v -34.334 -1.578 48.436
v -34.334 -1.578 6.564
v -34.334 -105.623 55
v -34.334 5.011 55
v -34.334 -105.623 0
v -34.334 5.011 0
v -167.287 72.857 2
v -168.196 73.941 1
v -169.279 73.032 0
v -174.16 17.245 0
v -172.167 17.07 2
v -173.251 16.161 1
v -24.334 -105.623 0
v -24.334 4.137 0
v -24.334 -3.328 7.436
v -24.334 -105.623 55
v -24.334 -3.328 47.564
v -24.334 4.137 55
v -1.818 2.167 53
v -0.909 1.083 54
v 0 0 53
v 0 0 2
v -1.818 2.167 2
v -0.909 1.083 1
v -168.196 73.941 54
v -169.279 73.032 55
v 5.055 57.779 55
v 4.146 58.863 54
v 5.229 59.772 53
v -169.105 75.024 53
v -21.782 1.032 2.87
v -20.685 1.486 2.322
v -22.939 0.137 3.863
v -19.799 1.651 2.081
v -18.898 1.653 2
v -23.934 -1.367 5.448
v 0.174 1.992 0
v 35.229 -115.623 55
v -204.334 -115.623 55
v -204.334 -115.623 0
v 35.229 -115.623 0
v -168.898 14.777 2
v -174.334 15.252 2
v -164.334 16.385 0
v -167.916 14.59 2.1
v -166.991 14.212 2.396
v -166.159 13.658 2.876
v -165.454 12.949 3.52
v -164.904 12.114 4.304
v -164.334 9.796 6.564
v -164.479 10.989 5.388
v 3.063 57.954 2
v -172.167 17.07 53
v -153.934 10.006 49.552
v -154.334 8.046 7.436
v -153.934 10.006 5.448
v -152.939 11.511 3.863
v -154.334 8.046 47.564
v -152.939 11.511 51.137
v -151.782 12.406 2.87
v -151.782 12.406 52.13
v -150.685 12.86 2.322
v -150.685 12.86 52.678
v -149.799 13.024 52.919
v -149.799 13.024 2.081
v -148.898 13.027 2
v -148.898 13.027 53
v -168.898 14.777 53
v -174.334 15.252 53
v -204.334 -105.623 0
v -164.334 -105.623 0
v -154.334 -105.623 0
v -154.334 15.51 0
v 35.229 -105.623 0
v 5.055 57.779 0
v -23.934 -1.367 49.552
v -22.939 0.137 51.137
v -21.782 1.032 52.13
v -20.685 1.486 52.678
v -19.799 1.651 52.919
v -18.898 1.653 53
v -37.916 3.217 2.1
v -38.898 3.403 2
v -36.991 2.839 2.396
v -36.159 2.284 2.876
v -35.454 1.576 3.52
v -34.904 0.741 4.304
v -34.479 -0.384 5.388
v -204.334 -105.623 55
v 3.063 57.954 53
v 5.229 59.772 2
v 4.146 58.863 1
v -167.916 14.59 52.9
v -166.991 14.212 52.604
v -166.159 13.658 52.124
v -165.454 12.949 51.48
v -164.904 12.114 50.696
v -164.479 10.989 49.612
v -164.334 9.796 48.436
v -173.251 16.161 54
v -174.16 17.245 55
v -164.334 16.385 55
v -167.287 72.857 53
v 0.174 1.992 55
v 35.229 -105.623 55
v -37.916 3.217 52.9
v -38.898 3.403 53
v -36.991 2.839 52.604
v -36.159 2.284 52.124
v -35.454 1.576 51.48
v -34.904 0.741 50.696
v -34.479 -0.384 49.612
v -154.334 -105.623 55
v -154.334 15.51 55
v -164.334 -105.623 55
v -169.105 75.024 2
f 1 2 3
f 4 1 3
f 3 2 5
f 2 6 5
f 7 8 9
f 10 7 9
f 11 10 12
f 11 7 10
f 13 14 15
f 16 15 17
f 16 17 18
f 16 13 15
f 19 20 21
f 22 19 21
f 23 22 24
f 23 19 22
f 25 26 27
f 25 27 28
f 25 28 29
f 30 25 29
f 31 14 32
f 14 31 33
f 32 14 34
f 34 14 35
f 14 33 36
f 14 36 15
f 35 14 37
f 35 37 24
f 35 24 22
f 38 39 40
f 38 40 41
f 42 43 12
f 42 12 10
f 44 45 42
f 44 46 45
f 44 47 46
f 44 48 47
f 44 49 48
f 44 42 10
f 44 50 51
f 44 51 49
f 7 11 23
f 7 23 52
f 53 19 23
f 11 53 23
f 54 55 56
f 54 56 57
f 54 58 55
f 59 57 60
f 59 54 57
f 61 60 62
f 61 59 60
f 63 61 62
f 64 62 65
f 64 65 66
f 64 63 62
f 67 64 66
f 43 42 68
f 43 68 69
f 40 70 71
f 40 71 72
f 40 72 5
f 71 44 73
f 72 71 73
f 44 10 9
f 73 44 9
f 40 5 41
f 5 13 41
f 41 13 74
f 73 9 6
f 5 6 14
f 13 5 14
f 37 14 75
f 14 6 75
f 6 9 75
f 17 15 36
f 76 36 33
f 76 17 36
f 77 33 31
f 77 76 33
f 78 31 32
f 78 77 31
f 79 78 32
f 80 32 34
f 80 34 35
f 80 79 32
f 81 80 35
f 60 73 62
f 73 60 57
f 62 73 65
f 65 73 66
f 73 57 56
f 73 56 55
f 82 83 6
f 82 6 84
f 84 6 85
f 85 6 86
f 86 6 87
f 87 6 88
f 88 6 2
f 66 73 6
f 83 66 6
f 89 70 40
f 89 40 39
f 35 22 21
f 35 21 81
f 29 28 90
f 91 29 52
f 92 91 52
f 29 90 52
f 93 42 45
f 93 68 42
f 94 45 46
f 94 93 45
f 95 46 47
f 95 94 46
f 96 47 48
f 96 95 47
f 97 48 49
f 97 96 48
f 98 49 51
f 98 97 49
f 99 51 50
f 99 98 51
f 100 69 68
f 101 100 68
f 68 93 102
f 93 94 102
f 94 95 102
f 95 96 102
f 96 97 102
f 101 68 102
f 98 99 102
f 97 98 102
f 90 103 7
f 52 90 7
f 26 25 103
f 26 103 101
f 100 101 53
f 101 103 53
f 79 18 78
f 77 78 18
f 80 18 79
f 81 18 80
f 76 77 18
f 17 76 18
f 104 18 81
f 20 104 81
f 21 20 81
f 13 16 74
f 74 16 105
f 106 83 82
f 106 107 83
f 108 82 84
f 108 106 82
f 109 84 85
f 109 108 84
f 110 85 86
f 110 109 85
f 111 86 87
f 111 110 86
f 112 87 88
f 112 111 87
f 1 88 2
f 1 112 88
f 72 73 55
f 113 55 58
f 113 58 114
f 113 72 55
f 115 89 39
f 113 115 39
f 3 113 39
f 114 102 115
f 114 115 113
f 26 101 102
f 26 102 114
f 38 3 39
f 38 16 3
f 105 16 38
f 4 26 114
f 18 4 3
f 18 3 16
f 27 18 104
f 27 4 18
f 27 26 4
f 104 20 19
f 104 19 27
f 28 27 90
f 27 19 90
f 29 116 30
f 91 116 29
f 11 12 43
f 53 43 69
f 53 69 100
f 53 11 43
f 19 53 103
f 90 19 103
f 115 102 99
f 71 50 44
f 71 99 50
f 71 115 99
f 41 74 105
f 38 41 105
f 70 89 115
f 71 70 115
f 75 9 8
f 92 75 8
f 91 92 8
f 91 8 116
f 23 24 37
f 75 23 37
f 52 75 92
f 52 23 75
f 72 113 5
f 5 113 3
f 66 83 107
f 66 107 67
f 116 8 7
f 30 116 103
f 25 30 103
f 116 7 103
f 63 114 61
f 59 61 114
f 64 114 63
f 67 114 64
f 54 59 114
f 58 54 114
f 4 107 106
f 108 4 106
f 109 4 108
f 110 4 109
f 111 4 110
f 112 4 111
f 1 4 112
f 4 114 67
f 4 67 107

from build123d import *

# Parameters (mm, degrees)
BOSS_EXTRUDE1_DEPTH = 55
SKETCH2_W           = 51
SKETCH2_H           = 56
CUT_EXTRUDE1_DEPTH  = 198.600505619
BOSS_EXTRUDE4_DEPTH = 55
SKETCH7_W           = 239.563416731
SKETCH7_H           = 55
BOSS_EXTRUDE5_DEPTH = 10
CHAMFER6_SIZE       = 2
CHAMFER7_SIZE       = 2
FILLET4_R           = 5
FILLET5_R           = 5
FILLET6_R           = 5
FILLET7_R           = 5


# Some blends are built 0.0001 mm under size
with BuildPart() as part:
    # Sketch1 → Boss-Extrude1 (new body)
    with BuildSketch(Plane.XY):
        Polygon((0, 0), (-174.334072166, 15.252254981), (-169.104727601, 75.023936866), (5.229344565, 59.771681886), align=None)
    extrude(amount=BOSS_EXTRUDE1_DEPTH)

    # Sketch2 → Cut-Extrude1 (cut, through all)
    with BuildSketch(Plane(origin=(0, 0, 0), x_dir=(0, 0, -1), z_dir=(0.9961946980917452, -0.08715574274766201, 0))):
        with Locations((-27.5, 30)):
            Rectangle(SKETCH2_W, SKETCH2_H)
    extrude(amount=-CUT_EXTRUDE1_DEPTH, mode=Mode.SUBTRACT)

    # Sketch3 → Boss-Extrude4 (add)
    with BuildSketch(Plane.XY):
        Polygon((-164.334072166, 14.377368346), (-164.334072166, -105.622631654), (-154.334072166, -105.622631654), (-154.334072166, 13.50248171), align=None)
        Polygon((-34.334072166, 3.003842087), (-34.334072166, -105.622631654), (-24.334072166, -105.622631654), (-24.334072166, 2.128955452), align=None)
    extrude(amount=BOSS_EXTRUDE4_DEPTH)

    # Sketch7 → Boss-Extrude5 (add)
    with BuildSketch(Plane.XZ.offset(105.622631654)):
        with Locations((-84.5523638, 27.5)):
            Rectangle(SKETCH7_W, SKETCH7_H)
    extrude(amount=BOSS_EXTRUDE5_DEPTH)

    # Chamfer6
    chamfer6_edges = [part.edges().sort_by_distance(p)[0] for p in [
        (-169.279039087, 73.03154747, 27.5),
        (-171.719399884, 45.138095924, 53),
        (-174.159760681, 17.244644377, 27.5),
        (-171.719399884, 45.138095924, 2),
        (2.614672282, 29.885840943, 2),
        (5.055033079, 57.779292489, 27.5),
        (2.614672282, 29.885840943, 53),
        (0.174311485, 1.992389396, 27.5),
    ]]
    chamfer(chamfer6_edges, length=CHAMFER6_SIZE - 0.0001)  # a hair under: the kernel refuses the full size

    # Chamfer7
    # the kernel refuses this chamfer: 2 mm, written as the material it takes off along each edge
    with BuildSketch(Plane(origin=(-159.21027825, 13.929094464, 55), x_dir=(-0.0023964235484937708, -0.027391246498851614, -0.9996219169112968), z_dir=(-0.9961946980917452, 0.08715574274766169, 0))) as chamfer7_piece_1_section:
        Polygon((CHAMFER7_SIZE * 0.999621916911, -CHAMFER7_SIZE * 0.0274958766106), (-CHAMFER7_SIZE * 0.0274958766106, -CHAMFER7_SIZE * 0.999621916911), (0, 0), align=None)
    chamfer7_piece_1 = extrude(amount=20.324930327, mode=Mode.PRIVATE)
    chamfer7_piece_1 = split(chamfer7_piece_1, bisect_by=Plane(origin=(-164.334072166, 15.69707124, 54.339627198), z_dir=(-1, 0, 0)), keep=Keep.TOP, mode=Mode.PRIVATE)
    add(chamfer7_piece_1, mode=Mode.SUBTRACT)
    with BuildSketch(Plane(origin=(-29.21027825, 2.555568205, 0), x_dir=(0.08712279063524543, 0.9958180537233409, -0.02749587661058642), z_dir=(-0.9961946980917452, 0.08715574274766169, 0))) as chamfer7_piece_2_section:
        Polygon((CHAMFER7_SIZE * 0.999621916911, -CHAMFER7_SIZE * 0.0274958766106), (-CHAMFER7_SIZE * 0.0274958766106, -CHAMFER7_SIZE * 0.999621916911), (0, 0), align=None)
    chamfer7_piece_2 = extrude(amount=130.745112457, mode=Mode.PRIVATE)
    chamfer7_piece_2 = split(chamfer7_piece_2, bisect_by=Plane(origin=(-34.334072166, 8.915268669, 0.659587254), z_dir=(-1, 0, 0)), keep=Keep.TOP, mode=Mode.PRIVATE)
    chamfer7_piece_2 = split(chamfer7_piece_2, bisect_by=Plane(origin=(-154.334072166, 8.915268669, 0.659587254), z_dir=(1, 0, 0)), keep=Keep.TOP, mode=Mode.PRIVATE)
    add(chamfer7_piece_2, mode=Mode.SUBTRACT)
    with BuildSketch(Plane(origin=(5.123793916, -0.448273882, 0), x_dir=(0.08712279063524543, 0.9958180537233409, -0.027495876610586438), z_dir=(-0.9961946980917452, 0.08715574274766169, 0))) as chamfer7_piece_3_section:
        Polygon((CHAMFER7_SIZE * 0.999621916911, -CHAMFER7_SIZE * 0.0274958766106), (-CHAMFER7_SIZE * 0.0274958766106, -CHAMFER7_SIZE * 0.999621916911), (0, 0), align=None)
    chamfer7_piece_3 = extrude(amount=34.71375632, mode=Mode.PRIVATE)
    chamfer7_piece_3 = split(chamfer7_piece_3, bisect_by=Plane(origin=(-24.334072166, 1.500682903, 0.659186265), z_dir=(1, 0, 0)), keep=Keep.TOP, mode=Mode.PRIVATE)
    add(chamfer7_piece_3, mode=Mode.SUBTRACT)
    with BuildSketch(Plane(origin=(-29.21027825, 2.555568205, 55), x_dir=(0.08712279063524543, 0.9958180537233409, 0.02749587661058574), z_dir=(-0.9961946980917452, 0.08715574274766169, 0))) as chamfer7_piece_4_section:
        Polygon((CHAMFER7_SIZE * 0.999621916911, CHAMFER7_SIZE * 0.0274958766106), (-CHAMFER7_SIZE * 0.0274958766106, CHAMFER7_SIZE * 0.999621916911), (0, 0), align=None)
    chamfer7_piece_4 = extrude(amount=130.745112457, mode=Mode.PRIVATE)
    chamfer7_piece_4 = split(chamfer7_piece_4, bisect_by=Plane(origin=(-34.334072166, 8.915268669, 54.340412746), z_dir=(-1, 0, 0)), keep=Keep.TOP, mode=Mode.PRIVATE)
    chamfer7_piece_4 = split(chamfer7_piece_4, bisect_by=Plane(origin=(-154.334072166, 8.915268669, 54.340412746), z_dir=(1, 0, 0)), keep=Keep.TOP, mode=Mode.PRIVATE)
    add(chamfer7_piece_4, mode=Mode.SUBTRACT)
    with BuildSketch(Plane(origin=(5.123793916, -0.448273882, 55), x_dir=(0.08712279063524543, 0.9958180537233409, 0.02749587661058574), z_dir=(-0.9961946980917452, 0.08715574274766169, 0))) as chamfer7_piece_5_section:
        Polygon((CHAMFER7_SIZE * 0.999621916911, CHAMFER7_SIZE * 0.0274958766106), (-CHAMFER7_SIZE * 0.0274958766106, CHAMFER7_SIZE * 0.999621916911), (0, 0), align=None)
    chamfer7_piece_5 = extrude(amount=34.71375632, mode=Mode.PRIVATE)
    chamfer7_piece_5 = split(chamfer7_piece_5, bisect_by=Plane(origin=(-24.334072166, 1.500682903, 54.340813735), z_dir=(1, 0, 0)), keep=Keep.TOP, mode=Mode.PRIVATE)
    add(chamfer7_piece_5, mode=Mode.SUBTRACT)
    with BuildSketch(Plane(origin=(-159.21027825, 13.929094464, 0), x_dir=(-0.002396423548493694, -0.02739124649885074, 0.9996219169112968), z_dir=(-0.9961946980917452, 0.08715574274766169, 0))) as chamfer7_piece_6_section:
        Polygon((CHAMFER7_SIZE * 0.999621916911, CHAMFER7_SIZE * 0.0274958766106), (-CHAMFER7_SIZE * 0.0274958766106, CHAMFER7_SIZE * 0.999621916911), (0, 0), align=None)
    chamfer7_piece_6 = extrude(amount=20.324930327, mode=Mode.PRIVATE)
    chamfer7_piece_6 = split(chamfer7_piece_6, bisect_by=Plane(origin=(-164.334072166, 15.69707124, 0.660372802), z_dir=(-1, 0, 0)), keep=Keep.TOP, mode=Mode.PRIVATE)
    add(chamfer7_piece_6, mode=Mode.SUBTRACT)
    with BuildSketch(Plane(origin=(-174.228521517, 75.472210748, 0), x_dir=(-0.08712279063524556, -0.9958180537233409, -0.02749587661058637), z_dir=(0.9961946980917452, -0.08715574274766183, 0))) as chamfer7_piece_7:
        Polygon((CHAMFER7_SIZE * 0.999621916911, -CHAMFER7_SIZE * 0.0274958766106), (-CHAMFER7_SIZE * 0.0274958766106, -CHAMFER7_SIZE * 0.999621916911), (0, 0), align=None)
    extrude(amount=185.286731952, mode=Mode.SUBTRACT)
    with BuildSketch(Plane(origin=(-174.228521517, 75.472210748, 55), x_dir=(-0.08712279063524556, -0.9958180537233409, 0.02749587661058563), z_dir=(0.9961946980917452, -0.08715574274766183, 0))) as chamfer7_piece_8:
        Polygon((CHAMFER7_SIZE * 0.999621916911, CHAMFER7_SIZE * 0.0274958766106), (-CHAMFER7_SIZE * 0.0274958766106, CHAMFER7_SIZE * 0.999621916911), (0, 0), align=None)
    extrude(amount=185.286731952, mode=Mode.SUBTRACT)

    # Fillet4
    fillet4_edges = [part.edges().sort_by_distance(p)[0] for p in [
        (-24.334072166, 2.128955452, 27.5),
    ]]
    fillet(fillet4_edges, radius=FILLET4_R)

    # Fillet5
    fillet5_edges = [part.edges().sort_by_distance(p)[0] for p in [
        (-34.334072166, 3.003842087, 27.5),
    ]]
    fillet(fillet5_edges, radius=FILLET5_R)

    # Fillet6
    fillet6_edges = [part.edges().sort_by_distance(p)[0] for p in [
        (-154.334072166, 13.50248171, 27.5),
    ]]
    fillet(fillet6_edges, radius=FILLET6_R)

    # Fillet7
    fillet7_edges = [part.edges().sort_by_distance(p)[0] for p in [
        (-164.334072166, 14.377368346, 27.5),
    ]]
    fillet(fillet7_edges, radius=FILLET7_R)


solid = part.part
